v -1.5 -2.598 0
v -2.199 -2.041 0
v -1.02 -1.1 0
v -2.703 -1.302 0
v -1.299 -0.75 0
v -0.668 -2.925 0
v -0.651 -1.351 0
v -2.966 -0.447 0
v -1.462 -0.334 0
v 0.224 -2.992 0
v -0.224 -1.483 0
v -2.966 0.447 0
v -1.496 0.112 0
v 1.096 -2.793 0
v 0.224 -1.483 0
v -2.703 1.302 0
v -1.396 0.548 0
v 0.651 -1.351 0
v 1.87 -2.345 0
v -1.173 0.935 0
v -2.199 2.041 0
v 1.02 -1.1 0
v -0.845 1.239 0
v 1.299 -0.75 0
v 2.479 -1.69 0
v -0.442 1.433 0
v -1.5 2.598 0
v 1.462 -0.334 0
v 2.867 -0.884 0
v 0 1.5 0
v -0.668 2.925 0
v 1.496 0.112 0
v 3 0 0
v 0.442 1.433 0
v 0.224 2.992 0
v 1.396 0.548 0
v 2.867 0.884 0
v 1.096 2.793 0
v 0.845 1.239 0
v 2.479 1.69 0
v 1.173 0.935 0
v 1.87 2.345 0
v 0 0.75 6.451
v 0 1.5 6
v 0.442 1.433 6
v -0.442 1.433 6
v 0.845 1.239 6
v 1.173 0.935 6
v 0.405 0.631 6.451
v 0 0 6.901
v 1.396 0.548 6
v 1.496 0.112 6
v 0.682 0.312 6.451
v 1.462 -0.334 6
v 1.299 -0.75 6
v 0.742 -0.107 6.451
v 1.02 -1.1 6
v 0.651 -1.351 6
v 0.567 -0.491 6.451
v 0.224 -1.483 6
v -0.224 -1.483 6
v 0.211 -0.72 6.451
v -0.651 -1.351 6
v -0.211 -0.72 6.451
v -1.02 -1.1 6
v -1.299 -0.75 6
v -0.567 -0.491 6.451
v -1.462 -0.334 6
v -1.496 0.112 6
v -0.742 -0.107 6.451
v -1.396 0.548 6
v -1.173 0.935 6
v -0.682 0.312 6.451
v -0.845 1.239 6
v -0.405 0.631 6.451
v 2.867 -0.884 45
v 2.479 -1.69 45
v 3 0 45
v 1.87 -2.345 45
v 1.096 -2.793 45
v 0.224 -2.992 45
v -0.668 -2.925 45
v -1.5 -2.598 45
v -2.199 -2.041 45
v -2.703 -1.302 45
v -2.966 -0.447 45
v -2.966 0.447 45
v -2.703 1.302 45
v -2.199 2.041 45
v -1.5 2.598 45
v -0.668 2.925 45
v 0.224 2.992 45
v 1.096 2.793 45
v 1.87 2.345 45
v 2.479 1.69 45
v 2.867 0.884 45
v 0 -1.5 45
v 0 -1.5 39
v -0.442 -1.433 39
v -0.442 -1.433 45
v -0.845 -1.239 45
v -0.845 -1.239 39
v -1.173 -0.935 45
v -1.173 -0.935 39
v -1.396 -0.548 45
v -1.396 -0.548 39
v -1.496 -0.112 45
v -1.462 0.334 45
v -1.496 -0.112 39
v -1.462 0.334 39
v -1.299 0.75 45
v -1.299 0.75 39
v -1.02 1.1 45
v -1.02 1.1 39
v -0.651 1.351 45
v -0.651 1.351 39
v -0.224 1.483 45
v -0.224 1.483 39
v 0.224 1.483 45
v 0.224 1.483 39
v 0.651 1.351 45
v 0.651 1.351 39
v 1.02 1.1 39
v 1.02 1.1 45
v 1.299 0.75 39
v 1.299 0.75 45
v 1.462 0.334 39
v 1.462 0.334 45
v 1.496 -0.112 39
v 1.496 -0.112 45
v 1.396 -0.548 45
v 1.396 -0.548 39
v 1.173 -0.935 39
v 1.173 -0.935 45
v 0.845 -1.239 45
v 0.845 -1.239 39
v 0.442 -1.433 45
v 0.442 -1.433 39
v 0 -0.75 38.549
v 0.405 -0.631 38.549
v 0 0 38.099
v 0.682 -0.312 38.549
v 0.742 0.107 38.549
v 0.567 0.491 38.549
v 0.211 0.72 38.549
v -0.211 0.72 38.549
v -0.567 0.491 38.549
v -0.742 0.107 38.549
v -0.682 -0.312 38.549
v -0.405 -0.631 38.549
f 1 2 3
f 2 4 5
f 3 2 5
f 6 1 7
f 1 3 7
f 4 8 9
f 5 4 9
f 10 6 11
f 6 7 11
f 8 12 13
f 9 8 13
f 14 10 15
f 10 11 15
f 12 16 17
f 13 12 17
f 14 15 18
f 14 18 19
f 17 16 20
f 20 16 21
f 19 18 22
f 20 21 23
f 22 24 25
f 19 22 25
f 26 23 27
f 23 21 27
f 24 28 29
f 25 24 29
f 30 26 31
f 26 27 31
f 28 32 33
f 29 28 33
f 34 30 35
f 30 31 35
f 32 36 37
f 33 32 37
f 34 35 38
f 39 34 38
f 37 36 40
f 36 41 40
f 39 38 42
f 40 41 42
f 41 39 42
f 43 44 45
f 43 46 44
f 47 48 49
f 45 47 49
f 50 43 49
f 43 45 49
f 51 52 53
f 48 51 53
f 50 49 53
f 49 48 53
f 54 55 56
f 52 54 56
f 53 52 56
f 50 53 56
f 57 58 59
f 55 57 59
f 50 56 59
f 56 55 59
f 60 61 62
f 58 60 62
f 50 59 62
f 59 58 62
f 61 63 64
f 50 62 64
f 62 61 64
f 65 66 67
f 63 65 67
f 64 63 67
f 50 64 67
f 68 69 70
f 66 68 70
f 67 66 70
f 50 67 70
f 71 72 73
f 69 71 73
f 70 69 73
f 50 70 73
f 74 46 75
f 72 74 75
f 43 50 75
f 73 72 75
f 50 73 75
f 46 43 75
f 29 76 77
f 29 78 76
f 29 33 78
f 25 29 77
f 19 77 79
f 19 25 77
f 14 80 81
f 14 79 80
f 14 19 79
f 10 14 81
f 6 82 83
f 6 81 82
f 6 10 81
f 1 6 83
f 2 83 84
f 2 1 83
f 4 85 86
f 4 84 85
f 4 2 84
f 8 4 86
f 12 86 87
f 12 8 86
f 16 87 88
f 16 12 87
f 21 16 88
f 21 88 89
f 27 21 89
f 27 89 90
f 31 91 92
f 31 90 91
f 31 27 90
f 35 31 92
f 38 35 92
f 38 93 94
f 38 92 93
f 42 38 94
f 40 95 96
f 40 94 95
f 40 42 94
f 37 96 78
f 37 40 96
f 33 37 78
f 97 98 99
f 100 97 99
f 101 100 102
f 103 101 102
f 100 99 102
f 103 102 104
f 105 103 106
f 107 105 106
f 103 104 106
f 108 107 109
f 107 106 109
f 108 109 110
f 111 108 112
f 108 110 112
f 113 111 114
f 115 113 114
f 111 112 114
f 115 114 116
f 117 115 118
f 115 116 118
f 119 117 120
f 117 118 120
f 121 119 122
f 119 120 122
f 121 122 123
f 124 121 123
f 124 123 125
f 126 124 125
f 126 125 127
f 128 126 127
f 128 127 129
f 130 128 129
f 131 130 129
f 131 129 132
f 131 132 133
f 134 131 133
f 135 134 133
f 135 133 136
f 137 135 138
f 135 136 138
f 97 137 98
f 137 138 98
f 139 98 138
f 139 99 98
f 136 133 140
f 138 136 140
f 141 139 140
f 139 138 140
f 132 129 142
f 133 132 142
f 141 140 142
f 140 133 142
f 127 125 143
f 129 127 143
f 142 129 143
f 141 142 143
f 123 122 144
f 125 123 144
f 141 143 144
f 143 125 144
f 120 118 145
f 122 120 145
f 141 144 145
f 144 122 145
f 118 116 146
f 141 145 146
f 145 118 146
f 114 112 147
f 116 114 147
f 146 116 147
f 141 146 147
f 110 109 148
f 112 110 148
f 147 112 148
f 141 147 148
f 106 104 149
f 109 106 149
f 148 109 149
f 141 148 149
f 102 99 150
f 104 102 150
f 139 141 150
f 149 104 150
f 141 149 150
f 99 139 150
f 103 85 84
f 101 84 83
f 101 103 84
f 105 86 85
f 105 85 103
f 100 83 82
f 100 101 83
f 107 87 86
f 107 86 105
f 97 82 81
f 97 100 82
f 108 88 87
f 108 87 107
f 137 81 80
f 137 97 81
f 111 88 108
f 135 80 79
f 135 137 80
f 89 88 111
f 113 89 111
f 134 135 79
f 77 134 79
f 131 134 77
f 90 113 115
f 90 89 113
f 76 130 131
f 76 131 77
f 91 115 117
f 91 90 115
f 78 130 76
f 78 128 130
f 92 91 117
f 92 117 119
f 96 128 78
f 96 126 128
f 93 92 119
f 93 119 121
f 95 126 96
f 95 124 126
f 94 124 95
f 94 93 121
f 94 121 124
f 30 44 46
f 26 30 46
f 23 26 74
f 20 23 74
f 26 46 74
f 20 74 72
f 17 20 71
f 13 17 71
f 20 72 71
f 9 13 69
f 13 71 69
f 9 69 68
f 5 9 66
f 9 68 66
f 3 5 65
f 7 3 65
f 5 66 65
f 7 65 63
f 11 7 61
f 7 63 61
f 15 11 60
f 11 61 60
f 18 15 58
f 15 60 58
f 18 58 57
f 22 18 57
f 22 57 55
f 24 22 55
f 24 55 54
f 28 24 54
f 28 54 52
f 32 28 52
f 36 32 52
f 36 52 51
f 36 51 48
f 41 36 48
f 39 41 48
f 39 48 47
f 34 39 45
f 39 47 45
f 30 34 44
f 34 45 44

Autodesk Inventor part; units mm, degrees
ref_plane "YZ Plane" through (0, 0, 0) normal (1, 0, 0) x (0, 1, 0)
ref_plane "XZ Plane" through (0, 0, 0) normal (0, 1, 0) x (-1, 0, 0)
ref_plane "XY Plane" through (0, 0, 0) normal (0, 0, 1) x (1, 0, 0)
sketch "スケッチ1" plane through (0, 0, 0) normal (0, 0, 1) x (1, 0, 0)
  circle A0 centre (0, 0) radius 3
  dimension "d0" = 6
extrude "押し出し1" add sketch "スケッチ1" along normal blind 45
hole "穴1" at (0, 0, 0) direction (0, 0, 1) diameter 3 depth 6 tip angle 118
sketch "スケッチ2" plane through (0, 0, 45) normal (0, 0, 1) x (1, 0, 0)
  circle A0 centre (0, 0) radius 3 projected
hole "穴2" at (0, 0, 45) direction (0, 0, -1) diameter 3 depth 6 tip angle 118
properties part number "スペーサ　m3-l45" material "アルミニウム 2014-T4"
